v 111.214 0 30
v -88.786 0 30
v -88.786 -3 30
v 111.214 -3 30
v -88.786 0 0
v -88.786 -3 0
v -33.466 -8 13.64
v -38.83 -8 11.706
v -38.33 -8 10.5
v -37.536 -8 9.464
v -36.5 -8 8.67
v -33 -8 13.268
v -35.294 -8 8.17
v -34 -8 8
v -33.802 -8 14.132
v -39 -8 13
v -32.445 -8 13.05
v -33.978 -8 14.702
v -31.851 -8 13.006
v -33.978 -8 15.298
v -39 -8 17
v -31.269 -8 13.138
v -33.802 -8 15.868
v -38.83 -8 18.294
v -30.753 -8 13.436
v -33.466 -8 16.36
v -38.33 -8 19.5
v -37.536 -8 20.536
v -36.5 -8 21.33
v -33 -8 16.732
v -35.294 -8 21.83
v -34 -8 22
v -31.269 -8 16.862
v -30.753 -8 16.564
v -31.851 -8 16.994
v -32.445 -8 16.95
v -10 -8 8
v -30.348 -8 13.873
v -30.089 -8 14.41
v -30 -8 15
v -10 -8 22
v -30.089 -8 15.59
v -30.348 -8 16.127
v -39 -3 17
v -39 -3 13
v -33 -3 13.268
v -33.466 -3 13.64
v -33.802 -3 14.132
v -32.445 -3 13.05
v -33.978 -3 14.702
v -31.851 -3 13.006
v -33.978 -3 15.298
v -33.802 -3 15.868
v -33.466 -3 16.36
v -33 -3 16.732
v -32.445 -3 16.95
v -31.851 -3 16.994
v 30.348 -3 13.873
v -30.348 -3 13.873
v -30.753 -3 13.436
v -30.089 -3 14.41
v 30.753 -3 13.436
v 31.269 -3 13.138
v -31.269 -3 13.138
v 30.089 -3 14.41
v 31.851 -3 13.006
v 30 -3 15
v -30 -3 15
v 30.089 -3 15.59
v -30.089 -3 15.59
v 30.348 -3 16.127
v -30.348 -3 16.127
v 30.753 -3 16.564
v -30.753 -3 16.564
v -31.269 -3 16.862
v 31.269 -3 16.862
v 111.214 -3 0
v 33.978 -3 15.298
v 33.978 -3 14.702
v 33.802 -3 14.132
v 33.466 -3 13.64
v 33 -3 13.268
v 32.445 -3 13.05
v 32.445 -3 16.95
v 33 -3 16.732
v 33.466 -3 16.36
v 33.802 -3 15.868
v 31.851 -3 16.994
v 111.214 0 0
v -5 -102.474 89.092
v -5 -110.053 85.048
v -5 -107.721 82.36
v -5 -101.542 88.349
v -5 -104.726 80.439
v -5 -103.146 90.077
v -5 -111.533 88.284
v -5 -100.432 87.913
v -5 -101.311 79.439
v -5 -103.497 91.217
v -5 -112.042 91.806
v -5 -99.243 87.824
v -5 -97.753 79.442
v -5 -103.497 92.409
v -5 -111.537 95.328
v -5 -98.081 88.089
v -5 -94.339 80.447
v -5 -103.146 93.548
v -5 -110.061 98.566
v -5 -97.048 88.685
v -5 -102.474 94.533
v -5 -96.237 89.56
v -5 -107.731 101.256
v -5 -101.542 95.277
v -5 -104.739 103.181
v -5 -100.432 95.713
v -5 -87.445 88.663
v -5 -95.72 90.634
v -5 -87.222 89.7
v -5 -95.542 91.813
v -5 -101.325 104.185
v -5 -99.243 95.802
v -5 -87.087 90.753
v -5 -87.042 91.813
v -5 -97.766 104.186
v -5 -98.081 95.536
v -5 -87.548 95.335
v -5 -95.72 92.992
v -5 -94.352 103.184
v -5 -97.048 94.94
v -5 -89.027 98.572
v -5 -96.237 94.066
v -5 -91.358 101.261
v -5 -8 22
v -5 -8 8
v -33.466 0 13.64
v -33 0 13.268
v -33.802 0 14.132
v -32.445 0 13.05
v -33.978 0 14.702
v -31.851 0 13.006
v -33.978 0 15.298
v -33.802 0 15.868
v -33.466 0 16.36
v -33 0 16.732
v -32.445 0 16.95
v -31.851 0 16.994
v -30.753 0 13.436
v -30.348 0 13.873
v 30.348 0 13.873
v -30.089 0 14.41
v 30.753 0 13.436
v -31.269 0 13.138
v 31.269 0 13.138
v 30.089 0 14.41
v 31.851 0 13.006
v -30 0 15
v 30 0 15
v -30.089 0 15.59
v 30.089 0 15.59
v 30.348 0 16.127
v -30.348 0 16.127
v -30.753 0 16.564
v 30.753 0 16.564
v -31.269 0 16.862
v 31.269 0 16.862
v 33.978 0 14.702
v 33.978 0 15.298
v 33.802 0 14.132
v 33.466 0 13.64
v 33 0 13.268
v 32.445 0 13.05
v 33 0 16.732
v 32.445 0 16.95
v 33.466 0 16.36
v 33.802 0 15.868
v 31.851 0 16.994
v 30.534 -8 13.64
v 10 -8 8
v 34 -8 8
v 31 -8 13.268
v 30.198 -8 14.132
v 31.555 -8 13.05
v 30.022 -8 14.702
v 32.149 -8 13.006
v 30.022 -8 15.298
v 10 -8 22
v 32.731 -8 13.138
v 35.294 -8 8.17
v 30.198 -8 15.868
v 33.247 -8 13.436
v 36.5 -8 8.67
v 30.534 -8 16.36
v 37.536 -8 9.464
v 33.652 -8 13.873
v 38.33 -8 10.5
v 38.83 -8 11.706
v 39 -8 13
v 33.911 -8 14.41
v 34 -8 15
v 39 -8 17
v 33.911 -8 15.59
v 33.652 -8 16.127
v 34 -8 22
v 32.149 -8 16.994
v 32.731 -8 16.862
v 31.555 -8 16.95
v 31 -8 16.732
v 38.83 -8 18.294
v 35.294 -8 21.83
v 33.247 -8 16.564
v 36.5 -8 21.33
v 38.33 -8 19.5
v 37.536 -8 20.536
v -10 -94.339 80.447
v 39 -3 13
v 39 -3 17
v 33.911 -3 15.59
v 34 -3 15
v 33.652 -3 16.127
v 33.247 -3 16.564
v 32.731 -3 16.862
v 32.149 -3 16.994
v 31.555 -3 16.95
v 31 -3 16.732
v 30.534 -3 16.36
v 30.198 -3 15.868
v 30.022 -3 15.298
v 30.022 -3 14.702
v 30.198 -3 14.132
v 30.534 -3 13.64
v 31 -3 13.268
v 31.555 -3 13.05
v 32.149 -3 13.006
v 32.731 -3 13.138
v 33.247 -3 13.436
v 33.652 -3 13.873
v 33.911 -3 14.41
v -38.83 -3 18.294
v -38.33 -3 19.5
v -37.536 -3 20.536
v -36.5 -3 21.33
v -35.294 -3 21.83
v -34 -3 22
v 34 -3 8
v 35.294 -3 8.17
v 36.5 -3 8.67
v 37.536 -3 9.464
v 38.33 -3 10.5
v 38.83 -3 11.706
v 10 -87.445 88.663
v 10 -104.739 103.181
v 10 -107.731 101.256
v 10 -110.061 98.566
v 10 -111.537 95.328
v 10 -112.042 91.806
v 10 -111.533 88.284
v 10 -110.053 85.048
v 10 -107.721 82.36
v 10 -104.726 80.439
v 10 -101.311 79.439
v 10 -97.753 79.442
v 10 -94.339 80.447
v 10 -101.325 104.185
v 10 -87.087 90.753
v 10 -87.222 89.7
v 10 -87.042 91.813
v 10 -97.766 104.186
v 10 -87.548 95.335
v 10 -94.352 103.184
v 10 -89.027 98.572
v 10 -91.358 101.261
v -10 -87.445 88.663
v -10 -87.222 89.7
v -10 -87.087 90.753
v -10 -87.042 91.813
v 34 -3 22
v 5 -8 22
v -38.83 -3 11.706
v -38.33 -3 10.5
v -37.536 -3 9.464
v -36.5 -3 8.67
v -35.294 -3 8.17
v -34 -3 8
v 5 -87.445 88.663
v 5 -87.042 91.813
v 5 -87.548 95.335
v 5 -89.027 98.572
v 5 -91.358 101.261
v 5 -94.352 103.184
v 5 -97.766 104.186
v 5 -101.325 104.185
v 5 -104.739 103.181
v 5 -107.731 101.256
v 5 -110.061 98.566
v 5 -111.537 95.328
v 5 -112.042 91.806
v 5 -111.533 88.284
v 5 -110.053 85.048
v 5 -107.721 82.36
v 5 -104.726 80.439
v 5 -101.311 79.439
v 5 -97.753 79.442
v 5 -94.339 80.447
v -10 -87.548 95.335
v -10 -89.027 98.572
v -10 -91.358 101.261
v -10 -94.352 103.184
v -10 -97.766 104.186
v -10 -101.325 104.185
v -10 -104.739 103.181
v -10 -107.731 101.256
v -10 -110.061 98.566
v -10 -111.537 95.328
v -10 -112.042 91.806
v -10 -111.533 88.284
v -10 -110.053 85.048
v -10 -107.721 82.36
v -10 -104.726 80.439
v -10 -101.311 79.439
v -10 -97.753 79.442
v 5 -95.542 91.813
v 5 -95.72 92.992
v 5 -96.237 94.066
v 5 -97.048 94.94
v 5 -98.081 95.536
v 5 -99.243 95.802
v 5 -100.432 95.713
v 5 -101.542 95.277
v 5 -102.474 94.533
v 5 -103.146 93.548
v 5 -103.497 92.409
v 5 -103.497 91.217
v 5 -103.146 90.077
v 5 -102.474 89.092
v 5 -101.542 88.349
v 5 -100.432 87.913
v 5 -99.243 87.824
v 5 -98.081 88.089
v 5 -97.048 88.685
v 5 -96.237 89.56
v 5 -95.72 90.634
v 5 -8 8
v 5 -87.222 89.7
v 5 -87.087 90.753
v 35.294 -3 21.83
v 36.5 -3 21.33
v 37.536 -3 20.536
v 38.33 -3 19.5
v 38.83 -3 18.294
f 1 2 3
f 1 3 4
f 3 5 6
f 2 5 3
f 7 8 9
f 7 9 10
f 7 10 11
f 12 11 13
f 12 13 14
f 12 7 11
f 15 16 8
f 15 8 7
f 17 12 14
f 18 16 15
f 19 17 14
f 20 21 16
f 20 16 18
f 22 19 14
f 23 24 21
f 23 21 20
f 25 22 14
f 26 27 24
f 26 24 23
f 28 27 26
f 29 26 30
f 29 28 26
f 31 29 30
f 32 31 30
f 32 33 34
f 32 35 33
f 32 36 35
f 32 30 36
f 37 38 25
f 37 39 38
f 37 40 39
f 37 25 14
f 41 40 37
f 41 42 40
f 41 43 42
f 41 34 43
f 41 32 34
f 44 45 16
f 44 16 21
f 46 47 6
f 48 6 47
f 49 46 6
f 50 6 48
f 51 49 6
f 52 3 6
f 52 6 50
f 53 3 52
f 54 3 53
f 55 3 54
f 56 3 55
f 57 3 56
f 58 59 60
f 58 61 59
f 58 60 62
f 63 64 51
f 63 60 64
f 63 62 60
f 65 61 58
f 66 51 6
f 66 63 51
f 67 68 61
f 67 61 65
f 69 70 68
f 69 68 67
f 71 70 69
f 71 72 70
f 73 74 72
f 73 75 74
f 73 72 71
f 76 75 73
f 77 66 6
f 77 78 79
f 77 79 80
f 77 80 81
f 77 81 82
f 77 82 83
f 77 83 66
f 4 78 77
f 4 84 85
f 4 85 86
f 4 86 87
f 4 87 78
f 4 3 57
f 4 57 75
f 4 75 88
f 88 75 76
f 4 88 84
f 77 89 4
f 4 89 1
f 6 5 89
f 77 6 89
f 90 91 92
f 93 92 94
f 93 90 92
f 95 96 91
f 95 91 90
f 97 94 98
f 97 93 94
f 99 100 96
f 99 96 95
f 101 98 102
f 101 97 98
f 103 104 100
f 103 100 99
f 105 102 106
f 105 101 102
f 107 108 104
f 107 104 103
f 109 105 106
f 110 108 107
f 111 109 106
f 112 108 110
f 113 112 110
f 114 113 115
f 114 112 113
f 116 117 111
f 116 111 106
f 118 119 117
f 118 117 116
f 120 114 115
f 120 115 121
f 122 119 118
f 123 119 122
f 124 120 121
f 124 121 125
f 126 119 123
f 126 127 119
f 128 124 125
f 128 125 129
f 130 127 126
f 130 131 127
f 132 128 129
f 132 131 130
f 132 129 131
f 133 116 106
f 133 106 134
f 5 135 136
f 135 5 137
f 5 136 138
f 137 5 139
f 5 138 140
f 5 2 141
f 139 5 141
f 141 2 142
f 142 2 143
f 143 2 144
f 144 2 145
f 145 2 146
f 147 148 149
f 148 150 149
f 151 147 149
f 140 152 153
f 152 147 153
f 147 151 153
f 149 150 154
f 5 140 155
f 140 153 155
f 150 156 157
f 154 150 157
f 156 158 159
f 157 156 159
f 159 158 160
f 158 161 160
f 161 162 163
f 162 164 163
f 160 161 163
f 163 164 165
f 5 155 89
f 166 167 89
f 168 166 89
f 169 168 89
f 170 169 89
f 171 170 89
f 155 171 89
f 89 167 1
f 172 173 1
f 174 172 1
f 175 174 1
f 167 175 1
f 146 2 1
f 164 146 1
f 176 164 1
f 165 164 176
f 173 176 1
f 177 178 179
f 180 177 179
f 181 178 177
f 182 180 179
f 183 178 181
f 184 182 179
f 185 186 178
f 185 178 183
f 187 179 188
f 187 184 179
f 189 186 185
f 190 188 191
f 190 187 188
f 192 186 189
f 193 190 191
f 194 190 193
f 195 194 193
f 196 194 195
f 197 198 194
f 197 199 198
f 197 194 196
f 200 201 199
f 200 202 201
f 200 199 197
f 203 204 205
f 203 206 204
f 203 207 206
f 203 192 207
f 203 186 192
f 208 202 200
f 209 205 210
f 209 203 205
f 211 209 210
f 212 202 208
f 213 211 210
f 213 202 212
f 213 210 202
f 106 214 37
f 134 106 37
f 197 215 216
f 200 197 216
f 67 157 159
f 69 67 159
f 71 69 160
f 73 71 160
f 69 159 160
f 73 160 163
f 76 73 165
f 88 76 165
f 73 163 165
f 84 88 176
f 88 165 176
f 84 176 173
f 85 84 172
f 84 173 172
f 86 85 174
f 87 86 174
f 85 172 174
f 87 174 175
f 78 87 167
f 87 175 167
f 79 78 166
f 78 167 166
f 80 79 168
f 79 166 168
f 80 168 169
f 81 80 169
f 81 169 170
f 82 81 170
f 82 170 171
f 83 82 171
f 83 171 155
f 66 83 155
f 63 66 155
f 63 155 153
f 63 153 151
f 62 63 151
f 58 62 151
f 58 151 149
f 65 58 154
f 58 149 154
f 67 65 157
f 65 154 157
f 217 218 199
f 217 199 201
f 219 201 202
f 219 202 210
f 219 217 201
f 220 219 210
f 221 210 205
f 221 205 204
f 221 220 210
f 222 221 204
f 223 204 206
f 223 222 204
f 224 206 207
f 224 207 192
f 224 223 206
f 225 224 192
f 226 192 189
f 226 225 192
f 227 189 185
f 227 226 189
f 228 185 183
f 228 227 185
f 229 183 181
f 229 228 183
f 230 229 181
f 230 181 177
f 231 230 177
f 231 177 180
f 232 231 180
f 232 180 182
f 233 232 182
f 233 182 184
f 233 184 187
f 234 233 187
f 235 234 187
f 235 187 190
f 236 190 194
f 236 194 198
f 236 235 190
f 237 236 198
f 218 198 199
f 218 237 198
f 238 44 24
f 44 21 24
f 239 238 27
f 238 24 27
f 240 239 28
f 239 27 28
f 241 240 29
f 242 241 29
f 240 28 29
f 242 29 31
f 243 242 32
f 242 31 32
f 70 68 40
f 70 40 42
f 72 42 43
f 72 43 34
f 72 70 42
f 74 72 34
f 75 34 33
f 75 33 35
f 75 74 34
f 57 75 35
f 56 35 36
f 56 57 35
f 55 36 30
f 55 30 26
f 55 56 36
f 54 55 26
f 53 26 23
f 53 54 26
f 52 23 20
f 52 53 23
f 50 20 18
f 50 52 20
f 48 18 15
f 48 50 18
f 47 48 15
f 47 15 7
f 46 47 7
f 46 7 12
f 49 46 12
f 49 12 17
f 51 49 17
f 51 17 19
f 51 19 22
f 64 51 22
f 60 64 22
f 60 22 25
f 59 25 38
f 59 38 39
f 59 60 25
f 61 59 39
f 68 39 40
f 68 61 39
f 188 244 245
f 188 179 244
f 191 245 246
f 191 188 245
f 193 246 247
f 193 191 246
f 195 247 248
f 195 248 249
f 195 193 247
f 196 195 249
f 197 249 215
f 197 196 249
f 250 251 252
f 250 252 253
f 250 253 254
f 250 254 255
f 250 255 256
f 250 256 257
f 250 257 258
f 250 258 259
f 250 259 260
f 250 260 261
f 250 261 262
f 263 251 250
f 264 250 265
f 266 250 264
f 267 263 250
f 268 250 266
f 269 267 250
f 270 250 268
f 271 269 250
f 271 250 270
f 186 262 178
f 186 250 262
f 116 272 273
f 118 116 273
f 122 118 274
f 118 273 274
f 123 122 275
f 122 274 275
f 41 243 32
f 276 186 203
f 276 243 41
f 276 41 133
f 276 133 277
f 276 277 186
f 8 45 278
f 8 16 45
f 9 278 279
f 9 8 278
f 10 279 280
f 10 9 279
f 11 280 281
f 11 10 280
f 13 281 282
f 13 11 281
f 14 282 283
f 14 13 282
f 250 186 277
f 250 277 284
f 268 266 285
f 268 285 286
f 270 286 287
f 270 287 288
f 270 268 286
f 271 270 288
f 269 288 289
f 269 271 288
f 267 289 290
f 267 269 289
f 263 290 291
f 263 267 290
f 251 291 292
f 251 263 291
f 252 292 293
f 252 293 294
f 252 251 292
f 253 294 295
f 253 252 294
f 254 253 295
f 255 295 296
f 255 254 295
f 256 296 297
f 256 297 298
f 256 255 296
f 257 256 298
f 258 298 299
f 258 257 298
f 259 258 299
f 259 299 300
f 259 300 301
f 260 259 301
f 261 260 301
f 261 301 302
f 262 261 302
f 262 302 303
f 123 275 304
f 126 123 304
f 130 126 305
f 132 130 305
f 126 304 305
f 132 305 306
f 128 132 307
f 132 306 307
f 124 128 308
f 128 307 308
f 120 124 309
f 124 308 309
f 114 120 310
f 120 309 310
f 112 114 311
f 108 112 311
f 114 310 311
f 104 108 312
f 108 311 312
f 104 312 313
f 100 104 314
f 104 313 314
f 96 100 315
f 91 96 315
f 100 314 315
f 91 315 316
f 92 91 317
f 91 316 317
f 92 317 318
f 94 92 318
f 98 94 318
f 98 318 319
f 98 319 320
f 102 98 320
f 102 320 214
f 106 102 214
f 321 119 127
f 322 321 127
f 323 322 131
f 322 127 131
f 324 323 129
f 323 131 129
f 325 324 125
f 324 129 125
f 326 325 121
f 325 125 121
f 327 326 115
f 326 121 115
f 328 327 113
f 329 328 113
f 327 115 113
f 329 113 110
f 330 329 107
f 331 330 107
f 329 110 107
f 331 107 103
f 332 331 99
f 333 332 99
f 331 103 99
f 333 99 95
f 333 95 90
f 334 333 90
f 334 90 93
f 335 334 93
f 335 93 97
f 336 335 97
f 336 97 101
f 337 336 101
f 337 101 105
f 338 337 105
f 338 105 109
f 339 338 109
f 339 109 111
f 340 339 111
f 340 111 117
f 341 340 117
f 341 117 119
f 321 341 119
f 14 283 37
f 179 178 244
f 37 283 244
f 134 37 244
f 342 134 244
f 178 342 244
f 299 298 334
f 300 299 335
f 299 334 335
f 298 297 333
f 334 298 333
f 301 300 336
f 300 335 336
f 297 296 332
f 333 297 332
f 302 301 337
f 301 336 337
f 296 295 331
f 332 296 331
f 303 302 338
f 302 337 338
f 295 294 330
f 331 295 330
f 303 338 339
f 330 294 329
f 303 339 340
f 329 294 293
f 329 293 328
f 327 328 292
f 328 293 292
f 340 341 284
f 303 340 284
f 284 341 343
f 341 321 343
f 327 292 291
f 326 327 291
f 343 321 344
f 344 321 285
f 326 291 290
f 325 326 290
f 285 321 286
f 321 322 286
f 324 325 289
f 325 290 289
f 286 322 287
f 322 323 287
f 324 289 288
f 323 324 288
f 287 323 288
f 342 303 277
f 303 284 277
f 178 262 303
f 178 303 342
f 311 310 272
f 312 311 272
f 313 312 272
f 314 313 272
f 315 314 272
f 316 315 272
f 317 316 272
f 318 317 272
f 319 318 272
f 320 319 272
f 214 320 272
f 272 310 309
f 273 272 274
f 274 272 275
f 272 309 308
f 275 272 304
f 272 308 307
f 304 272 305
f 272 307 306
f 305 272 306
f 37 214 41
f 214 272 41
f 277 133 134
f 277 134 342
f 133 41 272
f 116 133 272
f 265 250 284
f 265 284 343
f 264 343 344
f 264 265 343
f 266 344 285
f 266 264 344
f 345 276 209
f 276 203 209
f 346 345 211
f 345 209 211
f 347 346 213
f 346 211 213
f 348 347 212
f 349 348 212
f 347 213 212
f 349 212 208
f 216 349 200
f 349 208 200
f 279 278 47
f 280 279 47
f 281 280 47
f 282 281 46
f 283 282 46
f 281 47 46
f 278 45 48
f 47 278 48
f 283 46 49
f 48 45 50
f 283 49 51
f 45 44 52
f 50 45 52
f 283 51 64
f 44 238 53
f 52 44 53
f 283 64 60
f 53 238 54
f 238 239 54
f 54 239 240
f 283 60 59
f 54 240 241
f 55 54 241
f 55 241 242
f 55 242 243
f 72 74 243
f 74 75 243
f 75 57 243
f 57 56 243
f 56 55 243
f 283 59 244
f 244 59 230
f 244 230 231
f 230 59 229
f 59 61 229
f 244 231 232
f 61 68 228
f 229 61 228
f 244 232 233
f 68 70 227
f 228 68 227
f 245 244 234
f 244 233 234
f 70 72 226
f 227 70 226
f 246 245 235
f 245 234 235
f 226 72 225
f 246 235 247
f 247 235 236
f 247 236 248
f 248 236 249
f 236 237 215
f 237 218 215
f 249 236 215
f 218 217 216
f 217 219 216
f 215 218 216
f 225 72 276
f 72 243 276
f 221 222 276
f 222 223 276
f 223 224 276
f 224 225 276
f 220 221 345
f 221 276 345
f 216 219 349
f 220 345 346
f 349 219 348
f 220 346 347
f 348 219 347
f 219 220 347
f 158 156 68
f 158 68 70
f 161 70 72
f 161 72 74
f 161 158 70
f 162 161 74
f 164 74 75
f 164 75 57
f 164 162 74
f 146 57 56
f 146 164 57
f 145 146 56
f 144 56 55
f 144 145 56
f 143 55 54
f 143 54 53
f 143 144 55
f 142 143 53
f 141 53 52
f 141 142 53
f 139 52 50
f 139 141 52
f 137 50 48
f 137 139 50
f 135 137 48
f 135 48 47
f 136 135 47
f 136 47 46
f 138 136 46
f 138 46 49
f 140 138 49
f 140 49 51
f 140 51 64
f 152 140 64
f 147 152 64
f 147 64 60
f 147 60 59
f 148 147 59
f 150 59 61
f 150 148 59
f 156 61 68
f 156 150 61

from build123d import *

# Parameters (mm, degrees)
F0_W     = 200
F0_H     = 30
F0_R     = 2
F1_DEPTH = 3
F2_W     = 78
F2_H     = 14
F2_R     = 2
F3_DEPTH = 5
F4_R     = 5
F6_R     = 4
F7_DEPTH = 5
F9_DEPTH = 15


with BuildPart() as f1:
    # F0 (on Front) → F1 (new body)
    with BuildSketch(Plane.XZ):
        with Locations((11.214479804, 15)):
            Rectangle(F0_W, F0_H)
        with Locations((-32, 15)):
            Circle(F0_R, mode=Mode.SUBTRACT)
        with BuildLine():
            ThreePointArc((34, 15), (32, 13), (30, 15))
            ThreePointArc((30, 15), (32, 17), (34, 15))
        make_face(mode=Mode.SUBTRACT)
    extrude(amount=F1_DEPTH)


with BuildPart() as f3:
    # F2 (on face) → F3 (new body)
    with BuildSketch(Plane.XZ.offset(3)):
        with Locations((0, 15)):
            Rectangle(F2_W, F2_H)
        with Locations((-32, 15)):
            Circle(F2_R, mode=Mode.SUBTRACT)
        with Locations((32, 15)):
            Circle(F2_R, mode=Mode.SUBTRACT)
    extrude(amount=F3_DEPTH)

    # F4
    f4_edges = [f3.edges().sort_by_distance(p)[0] for p in [
        (-39, -5.5, 22),
        (-39, -5.5, 8),
        (39, -5.5, 8),
        (39, -5.5, 22),
    ]]
    fillet(f4_edges, radius=F4_R)

    # F8: F7 across plane


with BuildPart() as f7:
    # F6 (on offset) → F7 (new body)
    with BuildSketch(Plane.YZ.offset(-10)):
        with BuildLine():
            Line((-8, 8), (-8, 22))
            Line((-8, 22), (-87.4453999329, 88.6626057824))
            ThreePointArc((-87.4453999329, 88.6626057824), (-89.9663825552, 83.777961371), (-94.339054204, 80.4470685388))
            Line((-94.339054204, 80.4470685388), (-8, 8))
        make_face()
        with BuildLine():
            ThreePointArc((-94.339054204, 80.4470685388), (-89.9663825552, 83.777961371), (-87.4453999329, 88.6626057824))
            Line((-87.4453999329, 88.6626057824), (-99.9253331743, 99.1345131624))
            Line((-99.9253331743, 99.1345131624), (-106.8189874454, 90.9189759187))
            Line((-106.8189874454, 90.9189759187), (-94.339054204, 80.4470685388))
        make_face()
        with Locations((-99.5419380942, 91.8128064921)):
            Circle(F6_R, mode=Mode.SUBTRACT)
        with BuildLine():
            Line((-99.9253331743, 99.1345131624), (-87.4453999329, 88.6626057824))
            ThreePointArc((-87.4453999329, 88.6626057824), (-87.1432138248, 90.2248403427), (-87.0419380942, 91.8128064921))
            ThreePointArc((-87.0419380942, 91.8128064921), (-110.060636888, 98.5661001838), (-94.339054204, 80.4470685388))
            Line((-94.339054204, 80.4470685388), (-106.8189874454, 90.9189759187))
            Line((-106.8189874454, 90.9189759187), (-99.9253331743, 99.1345131624))
        make_face()
        with Locations((-99.5419380942, 91.8128064921)):
            Circle(F6_R)
    extrude(amount=F7_DEPTH)


with BuildPart() as f3_1:
    add(f3.part)
    add(f7.part.mirror(Plane.YZ))


    add(f7.part)  # F9 merges F7
    # F6 (on offset) → F9 (join, through all)
    with BuildSketch(Plane.YZ.offset(-10)):
        with Locations((-99.5419380942, 91.8128064921)):
            Circle(F6_R)
    extrude(amount=F9_DEPTH)


solid = Compound([f1.part, f3_1.part])
